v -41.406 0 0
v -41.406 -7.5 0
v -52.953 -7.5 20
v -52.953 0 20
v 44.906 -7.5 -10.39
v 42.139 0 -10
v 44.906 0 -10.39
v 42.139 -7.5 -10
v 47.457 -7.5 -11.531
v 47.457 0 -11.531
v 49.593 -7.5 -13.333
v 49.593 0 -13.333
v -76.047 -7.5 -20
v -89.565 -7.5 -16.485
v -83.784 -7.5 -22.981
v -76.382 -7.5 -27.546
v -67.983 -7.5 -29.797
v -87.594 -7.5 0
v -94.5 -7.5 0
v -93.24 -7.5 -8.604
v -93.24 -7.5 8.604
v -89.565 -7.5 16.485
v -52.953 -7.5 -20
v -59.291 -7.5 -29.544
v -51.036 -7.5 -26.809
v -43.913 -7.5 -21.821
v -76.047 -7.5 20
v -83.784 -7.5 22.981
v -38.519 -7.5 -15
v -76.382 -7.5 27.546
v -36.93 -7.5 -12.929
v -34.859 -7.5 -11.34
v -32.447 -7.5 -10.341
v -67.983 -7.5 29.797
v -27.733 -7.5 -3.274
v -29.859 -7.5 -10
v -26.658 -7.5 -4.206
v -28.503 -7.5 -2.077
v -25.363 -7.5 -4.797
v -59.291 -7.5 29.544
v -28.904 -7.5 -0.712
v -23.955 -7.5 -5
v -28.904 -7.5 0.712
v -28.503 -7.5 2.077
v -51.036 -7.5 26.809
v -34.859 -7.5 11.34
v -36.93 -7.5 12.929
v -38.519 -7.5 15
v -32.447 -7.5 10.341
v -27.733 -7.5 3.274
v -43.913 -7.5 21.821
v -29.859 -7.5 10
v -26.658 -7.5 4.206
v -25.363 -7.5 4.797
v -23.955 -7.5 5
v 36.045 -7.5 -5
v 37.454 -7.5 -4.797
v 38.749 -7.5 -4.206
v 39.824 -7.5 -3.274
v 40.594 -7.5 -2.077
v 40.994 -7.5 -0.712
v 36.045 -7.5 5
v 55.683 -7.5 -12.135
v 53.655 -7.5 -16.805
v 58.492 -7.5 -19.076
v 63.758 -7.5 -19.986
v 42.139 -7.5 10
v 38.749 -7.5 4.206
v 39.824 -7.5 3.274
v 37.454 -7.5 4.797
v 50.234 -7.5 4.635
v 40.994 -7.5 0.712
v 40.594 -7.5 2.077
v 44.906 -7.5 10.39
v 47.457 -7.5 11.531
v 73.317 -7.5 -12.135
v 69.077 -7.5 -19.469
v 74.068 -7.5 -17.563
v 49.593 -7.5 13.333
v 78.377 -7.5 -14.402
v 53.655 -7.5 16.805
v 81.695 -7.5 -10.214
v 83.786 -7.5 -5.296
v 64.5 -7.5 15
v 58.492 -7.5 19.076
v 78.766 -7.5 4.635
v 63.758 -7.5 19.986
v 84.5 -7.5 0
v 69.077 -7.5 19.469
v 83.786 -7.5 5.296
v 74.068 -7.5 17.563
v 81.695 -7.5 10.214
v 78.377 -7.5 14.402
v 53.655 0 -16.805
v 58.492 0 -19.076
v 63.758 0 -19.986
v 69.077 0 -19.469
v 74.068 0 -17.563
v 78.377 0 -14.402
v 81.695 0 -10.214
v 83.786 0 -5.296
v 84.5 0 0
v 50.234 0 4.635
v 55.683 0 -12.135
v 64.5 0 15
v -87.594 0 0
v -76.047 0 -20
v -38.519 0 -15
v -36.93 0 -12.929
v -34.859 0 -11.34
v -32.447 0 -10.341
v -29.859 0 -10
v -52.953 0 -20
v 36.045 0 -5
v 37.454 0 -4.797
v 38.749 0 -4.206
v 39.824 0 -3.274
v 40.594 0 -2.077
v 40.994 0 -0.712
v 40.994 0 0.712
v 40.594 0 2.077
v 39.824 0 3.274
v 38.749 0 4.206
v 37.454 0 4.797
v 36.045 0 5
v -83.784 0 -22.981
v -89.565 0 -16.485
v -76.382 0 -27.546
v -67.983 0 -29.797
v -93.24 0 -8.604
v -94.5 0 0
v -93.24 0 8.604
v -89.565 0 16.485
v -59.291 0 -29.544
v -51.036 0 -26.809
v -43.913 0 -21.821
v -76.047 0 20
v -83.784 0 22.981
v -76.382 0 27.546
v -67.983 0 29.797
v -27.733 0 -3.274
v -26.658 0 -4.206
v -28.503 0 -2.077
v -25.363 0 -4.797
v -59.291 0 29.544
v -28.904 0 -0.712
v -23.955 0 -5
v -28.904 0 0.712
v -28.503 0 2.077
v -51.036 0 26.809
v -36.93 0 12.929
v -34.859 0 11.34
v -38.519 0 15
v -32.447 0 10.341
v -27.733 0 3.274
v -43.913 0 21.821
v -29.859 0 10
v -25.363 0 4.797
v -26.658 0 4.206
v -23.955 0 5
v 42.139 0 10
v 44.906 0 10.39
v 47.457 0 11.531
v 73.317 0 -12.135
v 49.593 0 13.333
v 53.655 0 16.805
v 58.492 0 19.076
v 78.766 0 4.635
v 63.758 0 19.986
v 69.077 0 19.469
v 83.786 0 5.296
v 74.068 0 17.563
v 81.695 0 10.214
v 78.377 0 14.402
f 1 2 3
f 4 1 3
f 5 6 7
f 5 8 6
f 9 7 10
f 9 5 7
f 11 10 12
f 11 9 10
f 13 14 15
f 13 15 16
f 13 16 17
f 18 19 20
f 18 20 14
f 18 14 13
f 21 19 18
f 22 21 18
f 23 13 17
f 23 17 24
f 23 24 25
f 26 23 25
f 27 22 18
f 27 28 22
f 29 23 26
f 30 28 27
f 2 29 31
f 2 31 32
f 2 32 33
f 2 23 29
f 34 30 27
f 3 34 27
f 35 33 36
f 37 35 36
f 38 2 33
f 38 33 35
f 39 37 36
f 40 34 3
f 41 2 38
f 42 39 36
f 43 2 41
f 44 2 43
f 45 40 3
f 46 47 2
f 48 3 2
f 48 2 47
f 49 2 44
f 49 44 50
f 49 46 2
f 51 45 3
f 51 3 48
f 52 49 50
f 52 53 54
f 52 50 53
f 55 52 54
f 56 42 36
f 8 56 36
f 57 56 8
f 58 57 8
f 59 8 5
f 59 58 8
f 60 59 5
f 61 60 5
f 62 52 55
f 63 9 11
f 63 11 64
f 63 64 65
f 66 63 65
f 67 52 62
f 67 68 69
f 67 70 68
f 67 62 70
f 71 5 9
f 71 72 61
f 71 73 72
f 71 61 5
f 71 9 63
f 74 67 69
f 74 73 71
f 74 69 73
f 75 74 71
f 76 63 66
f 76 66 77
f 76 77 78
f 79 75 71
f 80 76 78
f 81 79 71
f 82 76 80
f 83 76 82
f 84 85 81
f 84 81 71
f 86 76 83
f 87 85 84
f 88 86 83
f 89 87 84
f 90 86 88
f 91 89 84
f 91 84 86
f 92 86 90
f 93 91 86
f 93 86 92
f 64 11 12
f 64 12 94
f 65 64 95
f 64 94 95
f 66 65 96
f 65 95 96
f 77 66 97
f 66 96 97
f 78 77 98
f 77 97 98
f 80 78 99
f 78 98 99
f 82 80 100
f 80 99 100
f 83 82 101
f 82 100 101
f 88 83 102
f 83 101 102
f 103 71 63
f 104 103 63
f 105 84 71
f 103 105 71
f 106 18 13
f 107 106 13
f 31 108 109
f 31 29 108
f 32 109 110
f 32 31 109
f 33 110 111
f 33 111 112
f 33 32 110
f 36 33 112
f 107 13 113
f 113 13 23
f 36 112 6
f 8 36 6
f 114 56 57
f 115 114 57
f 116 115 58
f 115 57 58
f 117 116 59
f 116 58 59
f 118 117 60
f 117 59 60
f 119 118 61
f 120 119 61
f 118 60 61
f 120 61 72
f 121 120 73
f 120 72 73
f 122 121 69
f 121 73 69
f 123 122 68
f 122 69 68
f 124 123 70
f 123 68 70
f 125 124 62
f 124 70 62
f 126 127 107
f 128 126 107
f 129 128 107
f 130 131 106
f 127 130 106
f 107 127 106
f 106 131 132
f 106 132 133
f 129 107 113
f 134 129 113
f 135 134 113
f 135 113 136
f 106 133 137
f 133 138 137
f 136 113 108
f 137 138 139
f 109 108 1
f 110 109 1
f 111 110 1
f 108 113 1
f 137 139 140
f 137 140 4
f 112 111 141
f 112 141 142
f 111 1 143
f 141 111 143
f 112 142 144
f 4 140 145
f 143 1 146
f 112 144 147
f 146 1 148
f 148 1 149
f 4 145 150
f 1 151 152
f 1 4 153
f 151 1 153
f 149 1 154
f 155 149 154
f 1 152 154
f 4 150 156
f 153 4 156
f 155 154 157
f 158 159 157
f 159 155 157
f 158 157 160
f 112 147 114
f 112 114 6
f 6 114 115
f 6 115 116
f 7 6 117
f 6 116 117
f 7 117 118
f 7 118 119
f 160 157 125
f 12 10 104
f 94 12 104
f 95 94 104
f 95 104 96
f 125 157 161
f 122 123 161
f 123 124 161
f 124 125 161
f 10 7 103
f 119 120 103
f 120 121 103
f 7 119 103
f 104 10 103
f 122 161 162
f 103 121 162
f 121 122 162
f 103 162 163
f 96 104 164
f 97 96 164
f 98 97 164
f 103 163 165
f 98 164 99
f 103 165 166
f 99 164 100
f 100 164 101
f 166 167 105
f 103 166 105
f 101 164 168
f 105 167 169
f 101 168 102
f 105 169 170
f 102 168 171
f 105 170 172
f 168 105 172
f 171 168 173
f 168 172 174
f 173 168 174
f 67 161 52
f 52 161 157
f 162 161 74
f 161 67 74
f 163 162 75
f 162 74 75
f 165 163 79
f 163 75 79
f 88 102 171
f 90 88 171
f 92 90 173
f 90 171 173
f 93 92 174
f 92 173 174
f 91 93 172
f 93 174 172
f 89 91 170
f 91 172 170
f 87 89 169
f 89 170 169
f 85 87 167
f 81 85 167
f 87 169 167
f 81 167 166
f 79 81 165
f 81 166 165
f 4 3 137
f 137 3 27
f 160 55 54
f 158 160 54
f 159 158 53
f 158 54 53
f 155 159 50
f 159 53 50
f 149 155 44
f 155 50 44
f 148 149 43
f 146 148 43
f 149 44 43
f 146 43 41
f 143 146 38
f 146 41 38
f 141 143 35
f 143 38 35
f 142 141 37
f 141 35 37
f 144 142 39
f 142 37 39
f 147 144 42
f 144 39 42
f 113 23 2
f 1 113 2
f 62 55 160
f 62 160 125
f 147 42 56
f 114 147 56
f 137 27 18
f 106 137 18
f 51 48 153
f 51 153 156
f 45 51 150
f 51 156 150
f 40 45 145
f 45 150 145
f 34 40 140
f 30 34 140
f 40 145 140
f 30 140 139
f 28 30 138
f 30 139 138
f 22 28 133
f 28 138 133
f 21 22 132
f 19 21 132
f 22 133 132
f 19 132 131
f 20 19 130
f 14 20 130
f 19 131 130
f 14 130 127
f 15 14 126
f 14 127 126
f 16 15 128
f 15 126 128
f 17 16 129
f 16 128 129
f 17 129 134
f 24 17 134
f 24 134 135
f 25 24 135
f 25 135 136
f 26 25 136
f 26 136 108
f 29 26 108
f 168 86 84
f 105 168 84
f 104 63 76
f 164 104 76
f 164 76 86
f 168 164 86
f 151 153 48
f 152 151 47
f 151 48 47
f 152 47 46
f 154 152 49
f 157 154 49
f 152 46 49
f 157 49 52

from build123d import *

# Parameters (mm, degrees)
F1_DEPTH = 7.5
F3_DEPTH = 25
F5_DEPTH = 25
F6_W     = 60
F6_H     = 10
F7_DEPTH = 25
F8_R     = 10


with BuildPart() as f1:
    # F0 (on Front) → F1 (new body)
    with BuildSketch(Plane.XZ):
        with BuildLine():
            Line((-64.5, -10), (-64.5, 10))
            Line((-64.5, 10), (-36.2157287525, 10))
            ThreePointArc((-36.2157287525, 10), (-94.5, 0), (-36.2157287525, -10))
            Line((-36.2157287525, -10), (-64.5, -10))
        make_face()
        with BuildLine():
            Line((-36.2157287525, 10), (-64.5, 10))
            Line((-64.5, 10), (-64.5, -10))
            Line((-64.5, -10), (-36.2157287525, -10))
            ThreePointArc((-36.2157287525, -10), (-34.9320432104, -5.0730593618), (-34.5, 0))
            ThreePointArc((-34.5, 0), (-34.9320432104, 5.0730593618), (-36.2157287525, 10))
        make_face()
        with BuildLine():
            Line((47.1794919243, 10), (-36.2157287525, 10))
            ThreePointArc((-36.2157287525, 10), (-34.9320432104, 5.0730593618), (-34.5, 0))
            ThreePointArc((-34.5, 0), (-34.9320432104, -5.0730593618), (-36.2157287525, -10))
            Line((-36.2157287525, -10), (47.1794919243, -10))
            ThreePointArc((47.1794919243, -10), (44.5, 0), (47.1794919243, 10))
        make_face()
        with BuildLine():
            ThreePointArc((84.5, 0), (69.6763809021, 19.3185165258), (47.1794919243, 10))
            Line((47.1794919243, 10), (64.5, 10))
            Line((64.5, 10), (64.5, -10))
            Line((64.5, -10), (47.1794919243, -10))
            ThreePointArc((47.1794919243, -10), (69.6763809021, -19.3185165258), (84.5, 0))
        make_face()
        with BuildLine():
            Line((64.5, 10), (47.1794919243, 10))
            ThreePointArc((47.1794919243, 10), (44.5, 0), (47.1794919243, -10))
            Line((47.1794919243, -10), (64.5, -10))
            Line((64.5, -10), (64.5, 10))
        make_face()
    extrude(amount=F1_DEPTH)

    # F2 (on face) → F3 (cut)
    with BuildSketch(Plane.XZ.offset(7.5)):
        Polygon((-52.9529946162, 20), (-76.0470053838, 20), (-87.5940107676, 0), (-76.0470053838, -20), (-52.9529946162, -20), (-41.4059892324, 0), align=None)
    extrude(amount=-F3_DEPTH, mode=Mode.SUBTRACT)

    # F4 (on face) → F5 (cut)
    with BuildSketch(Plane.XZ.offset(7.5)):
        Polygon((73.3167787844, -12.1352549156), (78.7658477444, 4.6352549156), (64.5, 15), (50.2341522556, 4.6352549156), (55.6832212156, -12.1352549156), align=None)
    extrude(amount=-F5_DEPTH, mode=Mode.SUBTRACT)

    # F6 (on face) → F7 (cut)
    with BuildSketch(Plane.XZ.offset(7.5)):
        with Locations((6.0453672857, 0)):
            Rectangle(F6_W, F6_H)
        with BuildLine():
            ThreePointArc((-23.9546327143, 5), (-28.9546327143, 0), (-23.9546327143, -5))
            Line((-23.9546327143, -5), (-23.9546327143, 5))
        make_face()
        with BuildLine():
            Line((36.0453672857, 5), (36.0453672857, -5))
            ThreePointArc((36.0453672857, -5), (41.0453672857, 0), (36.0453672857, 5))
        make_face()
    extrude(amount=-F7_DEPTH, mode=Mode.SUBTRACT)

    # F8
    f8_edges = [f1.edges().sort_by_distance(p)[0] for p in [
        (-36.215729, -3.75, -10),
        (47.179492, -3.75, 10),
        (47.179492, -3.75, -10),
        (-36.215729, -3.75, 10),
    ]]
    fillet(f8_edges, radius=F8_R)


solid = f1.part
